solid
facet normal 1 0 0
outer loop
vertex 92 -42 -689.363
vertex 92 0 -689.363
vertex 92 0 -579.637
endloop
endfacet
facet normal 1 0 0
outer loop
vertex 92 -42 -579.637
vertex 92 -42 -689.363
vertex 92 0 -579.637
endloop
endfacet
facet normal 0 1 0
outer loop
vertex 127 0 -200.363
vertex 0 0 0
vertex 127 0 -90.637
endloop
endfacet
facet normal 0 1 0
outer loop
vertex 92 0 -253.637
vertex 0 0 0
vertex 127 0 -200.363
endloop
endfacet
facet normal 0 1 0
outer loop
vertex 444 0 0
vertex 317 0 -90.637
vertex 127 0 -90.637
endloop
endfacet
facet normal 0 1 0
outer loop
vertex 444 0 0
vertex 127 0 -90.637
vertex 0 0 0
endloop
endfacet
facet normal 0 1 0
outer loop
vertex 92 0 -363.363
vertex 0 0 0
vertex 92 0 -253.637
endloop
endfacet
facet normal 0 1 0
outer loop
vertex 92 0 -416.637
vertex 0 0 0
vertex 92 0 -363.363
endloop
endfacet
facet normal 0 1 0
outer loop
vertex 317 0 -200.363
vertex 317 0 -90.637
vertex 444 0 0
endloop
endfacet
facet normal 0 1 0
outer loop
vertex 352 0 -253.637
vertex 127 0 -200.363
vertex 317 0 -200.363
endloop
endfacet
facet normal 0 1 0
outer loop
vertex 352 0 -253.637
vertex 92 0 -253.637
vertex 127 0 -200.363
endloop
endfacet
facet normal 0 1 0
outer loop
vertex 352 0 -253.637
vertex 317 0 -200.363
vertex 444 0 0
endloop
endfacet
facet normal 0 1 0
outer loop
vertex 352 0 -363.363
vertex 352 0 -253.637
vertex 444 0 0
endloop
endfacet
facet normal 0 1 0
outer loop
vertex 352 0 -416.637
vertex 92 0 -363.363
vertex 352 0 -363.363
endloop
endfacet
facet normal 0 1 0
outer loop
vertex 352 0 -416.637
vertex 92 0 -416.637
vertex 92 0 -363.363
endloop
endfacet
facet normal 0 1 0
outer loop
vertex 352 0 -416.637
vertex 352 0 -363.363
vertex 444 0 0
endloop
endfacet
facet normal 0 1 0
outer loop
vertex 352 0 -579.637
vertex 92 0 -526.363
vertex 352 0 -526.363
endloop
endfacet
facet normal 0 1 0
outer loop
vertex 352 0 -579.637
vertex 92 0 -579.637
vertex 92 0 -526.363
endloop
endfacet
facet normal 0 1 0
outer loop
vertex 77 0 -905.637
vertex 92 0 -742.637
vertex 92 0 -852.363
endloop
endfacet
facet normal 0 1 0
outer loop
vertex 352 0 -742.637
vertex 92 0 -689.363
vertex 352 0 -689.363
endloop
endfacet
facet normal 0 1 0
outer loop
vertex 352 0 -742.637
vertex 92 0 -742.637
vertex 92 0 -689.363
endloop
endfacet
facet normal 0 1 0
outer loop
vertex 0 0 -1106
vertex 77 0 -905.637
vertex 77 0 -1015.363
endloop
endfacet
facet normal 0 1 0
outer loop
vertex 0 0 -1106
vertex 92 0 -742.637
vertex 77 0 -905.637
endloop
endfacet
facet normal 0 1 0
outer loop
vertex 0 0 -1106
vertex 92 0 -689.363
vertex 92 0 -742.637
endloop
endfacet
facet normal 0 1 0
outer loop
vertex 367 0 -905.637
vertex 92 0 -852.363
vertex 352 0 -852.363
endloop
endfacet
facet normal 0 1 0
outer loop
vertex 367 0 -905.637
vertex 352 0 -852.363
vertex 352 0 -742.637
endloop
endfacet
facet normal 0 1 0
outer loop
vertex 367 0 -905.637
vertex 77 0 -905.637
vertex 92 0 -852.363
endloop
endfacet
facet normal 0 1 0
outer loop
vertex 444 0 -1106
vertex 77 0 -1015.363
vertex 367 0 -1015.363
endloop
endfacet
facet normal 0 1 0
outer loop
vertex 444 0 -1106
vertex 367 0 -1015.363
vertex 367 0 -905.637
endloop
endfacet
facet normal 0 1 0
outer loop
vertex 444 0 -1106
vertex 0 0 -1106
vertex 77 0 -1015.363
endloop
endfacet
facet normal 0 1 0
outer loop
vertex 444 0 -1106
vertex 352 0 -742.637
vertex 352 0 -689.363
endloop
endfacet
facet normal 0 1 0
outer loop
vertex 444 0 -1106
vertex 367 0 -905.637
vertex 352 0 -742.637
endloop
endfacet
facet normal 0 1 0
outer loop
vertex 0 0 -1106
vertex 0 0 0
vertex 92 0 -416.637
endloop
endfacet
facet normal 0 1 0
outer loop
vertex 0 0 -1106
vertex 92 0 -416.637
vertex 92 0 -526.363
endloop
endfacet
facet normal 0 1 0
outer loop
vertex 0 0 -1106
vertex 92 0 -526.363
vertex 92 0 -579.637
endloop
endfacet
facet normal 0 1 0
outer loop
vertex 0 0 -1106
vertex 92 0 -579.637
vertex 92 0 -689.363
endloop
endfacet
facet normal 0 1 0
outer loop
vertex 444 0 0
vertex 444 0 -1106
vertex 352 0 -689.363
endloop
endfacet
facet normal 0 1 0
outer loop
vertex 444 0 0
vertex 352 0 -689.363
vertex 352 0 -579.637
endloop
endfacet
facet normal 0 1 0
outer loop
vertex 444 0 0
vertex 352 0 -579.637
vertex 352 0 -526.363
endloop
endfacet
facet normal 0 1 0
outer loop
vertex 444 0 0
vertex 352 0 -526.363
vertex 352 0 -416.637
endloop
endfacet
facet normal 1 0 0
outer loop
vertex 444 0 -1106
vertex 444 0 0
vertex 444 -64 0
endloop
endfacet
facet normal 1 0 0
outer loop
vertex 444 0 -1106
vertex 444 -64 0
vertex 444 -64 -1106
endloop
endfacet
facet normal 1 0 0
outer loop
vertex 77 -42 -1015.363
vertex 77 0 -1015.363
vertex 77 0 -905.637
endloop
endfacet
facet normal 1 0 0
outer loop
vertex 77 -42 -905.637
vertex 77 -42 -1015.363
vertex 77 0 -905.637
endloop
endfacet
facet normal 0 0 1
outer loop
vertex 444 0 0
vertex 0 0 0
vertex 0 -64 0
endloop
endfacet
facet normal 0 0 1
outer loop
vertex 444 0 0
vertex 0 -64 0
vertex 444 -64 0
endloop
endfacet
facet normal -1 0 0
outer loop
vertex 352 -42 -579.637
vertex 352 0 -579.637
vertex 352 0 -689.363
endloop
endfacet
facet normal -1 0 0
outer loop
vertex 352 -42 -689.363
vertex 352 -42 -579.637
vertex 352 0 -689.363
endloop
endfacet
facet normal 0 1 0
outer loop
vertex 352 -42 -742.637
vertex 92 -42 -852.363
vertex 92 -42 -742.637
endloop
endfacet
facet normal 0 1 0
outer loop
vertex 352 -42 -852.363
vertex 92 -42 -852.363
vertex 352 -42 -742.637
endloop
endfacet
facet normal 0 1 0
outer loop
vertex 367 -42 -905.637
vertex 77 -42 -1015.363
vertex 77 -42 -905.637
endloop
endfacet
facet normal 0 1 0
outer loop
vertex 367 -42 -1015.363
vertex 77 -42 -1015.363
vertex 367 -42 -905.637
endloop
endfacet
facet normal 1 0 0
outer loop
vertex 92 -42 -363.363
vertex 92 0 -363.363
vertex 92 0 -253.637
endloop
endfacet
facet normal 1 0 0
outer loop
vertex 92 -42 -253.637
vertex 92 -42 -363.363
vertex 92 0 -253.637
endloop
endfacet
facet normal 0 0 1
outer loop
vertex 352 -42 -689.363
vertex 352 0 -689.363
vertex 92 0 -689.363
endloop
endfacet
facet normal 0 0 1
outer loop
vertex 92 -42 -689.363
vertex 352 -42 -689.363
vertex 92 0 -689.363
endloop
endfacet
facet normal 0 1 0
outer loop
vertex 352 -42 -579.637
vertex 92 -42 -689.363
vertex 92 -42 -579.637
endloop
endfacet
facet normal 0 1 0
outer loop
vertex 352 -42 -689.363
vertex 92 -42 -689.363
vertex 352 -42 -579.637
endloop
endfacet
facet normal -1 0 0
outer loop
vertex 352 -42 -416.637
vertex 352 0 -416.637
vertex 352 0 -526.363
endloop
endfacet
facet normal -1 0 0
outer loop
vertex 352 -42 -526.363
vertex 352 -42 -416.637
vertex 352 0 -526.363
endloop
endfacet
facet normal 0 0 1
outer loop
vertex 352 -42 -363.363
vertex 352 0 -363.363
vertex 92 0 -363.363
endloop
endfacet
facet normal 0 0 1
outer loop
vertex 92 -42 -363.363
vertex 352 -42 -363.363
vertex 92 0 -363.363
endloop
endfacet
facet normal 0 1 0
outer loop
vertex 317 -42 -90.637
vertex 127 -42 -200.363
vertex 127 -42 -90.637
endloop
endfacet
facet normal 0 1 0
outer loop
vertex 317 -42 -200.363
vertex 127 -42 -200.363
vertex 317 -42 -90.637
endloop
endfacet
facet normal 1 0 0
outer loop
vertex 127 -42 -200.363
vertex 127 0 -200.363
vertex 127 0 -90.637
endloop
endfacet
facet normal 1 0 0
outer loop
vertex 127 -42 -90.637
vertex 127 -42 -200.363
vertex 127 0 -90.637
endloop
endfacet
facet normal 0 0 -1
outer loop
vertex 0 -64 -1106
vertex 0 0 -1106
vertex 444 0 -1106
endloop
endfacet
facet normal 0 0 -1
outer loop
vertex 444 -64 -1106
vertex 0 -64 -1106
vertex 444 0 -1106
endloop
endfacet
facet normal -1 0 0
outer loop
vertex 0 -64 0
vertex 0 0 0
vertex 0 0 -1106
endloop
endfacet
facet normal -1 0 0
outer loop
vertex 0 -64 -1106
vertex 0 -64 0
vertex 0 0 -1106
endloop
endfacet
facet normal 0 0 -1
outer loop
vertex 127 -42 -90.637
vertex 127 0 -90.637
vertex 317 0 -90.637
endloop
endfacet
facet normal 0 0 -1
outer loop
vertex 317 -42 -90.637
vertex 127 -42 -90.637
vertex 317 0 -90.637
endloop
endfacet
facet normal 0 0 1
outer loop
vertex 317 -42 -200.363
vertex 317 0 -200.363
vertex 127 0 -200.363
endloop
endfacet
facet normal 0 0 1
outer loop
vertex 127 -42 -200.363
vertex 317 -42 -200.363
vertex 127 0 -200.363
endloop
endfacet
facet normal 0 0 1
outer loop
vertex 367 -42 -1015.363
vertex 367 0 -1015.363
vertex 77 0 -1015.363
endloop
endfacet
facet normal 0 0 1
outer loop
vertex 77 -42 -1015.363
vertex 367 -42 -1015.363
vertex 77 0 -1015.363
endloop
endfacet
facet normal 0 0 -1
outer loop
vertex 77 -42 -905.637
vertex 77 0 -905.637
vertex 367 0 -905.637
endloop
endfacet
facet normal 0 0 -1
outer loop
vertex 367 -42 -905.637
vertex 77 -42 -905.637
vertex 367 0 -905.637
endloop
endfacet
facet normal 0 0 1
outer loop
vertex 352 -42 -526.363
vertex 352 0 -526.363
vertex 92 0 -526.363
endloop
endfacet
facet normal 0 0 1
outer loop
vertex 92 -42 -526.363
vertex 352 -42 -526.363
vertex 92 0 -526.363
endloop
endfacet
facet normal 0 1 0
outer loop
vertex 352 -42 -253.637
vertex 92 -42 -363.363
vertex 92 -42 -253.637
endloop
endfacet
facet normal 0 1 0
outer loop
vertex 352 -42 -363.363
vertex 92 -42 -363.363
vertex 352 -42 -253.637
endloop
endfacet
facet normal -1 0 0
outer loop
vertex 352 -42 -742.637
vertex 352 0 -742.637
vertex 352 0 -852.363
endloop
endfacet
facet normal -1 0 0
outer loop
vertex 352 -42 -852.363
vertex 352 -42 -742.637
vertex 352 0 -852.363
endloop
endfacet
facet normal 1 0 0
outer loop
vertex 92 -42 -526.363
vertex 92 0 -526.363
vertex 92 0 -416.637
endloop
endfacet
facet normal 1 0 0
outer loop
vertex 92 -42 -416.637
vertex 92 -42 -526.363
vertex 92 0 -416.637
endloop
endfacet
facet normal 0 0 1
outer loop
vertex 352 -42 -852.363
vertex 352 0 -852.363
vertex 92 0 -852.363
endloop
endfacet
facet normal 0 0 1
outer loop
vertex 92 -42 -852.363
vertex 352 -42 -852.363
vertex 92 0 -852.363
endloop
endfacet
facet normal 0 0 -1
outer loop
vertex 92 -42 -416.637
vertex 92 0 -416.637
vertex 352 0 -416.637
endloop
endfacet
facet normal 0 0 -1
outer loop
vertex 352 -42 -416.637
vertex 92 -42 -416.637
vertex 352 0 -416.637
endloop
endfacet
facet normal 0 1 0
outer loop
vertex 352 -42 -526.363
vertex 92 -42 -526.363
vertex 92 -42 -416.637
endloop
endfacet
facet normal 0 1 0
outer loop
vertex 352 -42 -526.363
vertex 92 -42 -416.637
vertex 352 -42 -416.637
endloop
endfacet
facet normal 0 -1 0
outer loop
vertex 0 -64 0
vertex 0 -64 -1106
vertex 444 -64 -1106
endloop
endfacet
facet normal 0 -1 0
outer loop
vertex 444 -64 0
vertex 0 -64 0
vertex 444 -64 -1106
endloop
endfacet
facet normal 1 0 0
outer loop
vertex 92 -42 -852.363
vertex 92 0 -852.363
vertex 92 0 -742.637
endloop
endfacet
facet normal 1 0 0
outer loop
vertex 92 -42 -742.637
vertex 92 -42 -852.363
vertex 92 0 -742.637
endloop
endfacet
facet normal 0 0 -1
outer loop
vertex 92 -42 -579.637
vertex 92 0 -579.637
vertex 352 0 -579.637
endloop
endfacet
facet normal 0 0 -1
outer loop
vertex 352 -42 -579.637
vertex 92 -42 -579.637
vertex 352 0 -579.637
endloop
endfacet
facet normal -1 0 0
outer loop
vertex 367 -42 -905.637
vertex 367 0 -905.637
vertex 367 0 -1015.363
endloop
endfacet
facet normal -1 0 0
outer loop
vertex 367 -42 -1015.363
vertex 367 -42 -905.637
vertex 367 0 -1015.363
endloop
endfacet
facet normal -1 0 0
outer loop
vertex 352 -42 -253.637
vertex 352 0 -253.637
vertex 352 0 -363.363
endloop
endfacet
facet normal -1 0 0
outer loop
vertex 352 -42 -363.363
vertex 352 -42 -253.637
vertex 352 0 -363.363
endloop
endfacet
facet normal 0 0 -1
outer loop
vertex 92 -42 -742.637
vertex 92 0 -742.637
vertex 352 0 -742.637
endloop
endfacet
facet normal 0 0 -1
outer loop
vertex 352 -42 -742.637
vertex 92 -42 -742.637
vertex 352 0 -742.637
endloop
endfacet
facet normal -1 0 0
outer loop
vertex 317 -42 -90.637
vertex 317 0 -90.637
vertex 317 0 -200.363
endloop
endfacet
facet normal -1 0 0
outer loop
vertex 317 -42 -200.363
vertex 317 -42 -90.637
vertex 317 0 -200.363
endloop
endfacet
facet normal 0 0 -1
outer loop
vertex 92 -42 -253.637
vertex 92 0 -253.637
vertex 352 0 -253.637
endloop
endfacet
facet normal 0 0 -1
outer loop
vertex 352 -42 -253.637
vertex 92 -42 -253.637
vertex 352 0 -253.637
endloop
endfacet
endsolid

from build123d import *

# Parameters (mm, degrees)
SKETCH_1_W          = 444
SKETCH_1_H          = 1106
EXTRUDE_305_DEPTH   = 64
CUT_EXTRUDE_1_DEPTH = 42


with BuildPart() as part:
    # Эскиз1 → Extrude 305 (new body)
    with BuildSketch(Plane(origin=(0, 0, 0), x_dir=(1, 0, 0), z_dir=(0, 1, 0))):
        with Locations((222, 553)):
            Rectangle(SKETCH_1_W, SKETCH_1_H)
    extrude(amount=-EXTRUDE_305_DEPTH)

    # Эскиз2 → Вырез-Вытянуть1 (cut)
    with BuildSketch(Plane(origin=(0, 0, 0), x_dir=(1, 0, 0), z_dir=(0, 1, 0))):
        Polygon((222, 1015.363466897), (77, 1015.363466897), (77, 905.636533103), (222, 905.636533103), (367, 905.636533103), (367, 1015.363466897), align=None)
        Polygon((222, 852.363466897), (92, 852.363466897), (92, 742.636533103), (222, 742.636533103), (352, 742.636533103), (352, 852.363466897), align=None)
        Polygon((222, 689.363466897), (92, 689.363466897), (92, 579.636533103), (222, 579.636533103), (352, 579.636533103), (352, 689.363466897), align=None)
        Polygon((222, 526.363466897), (92, 526.363466897), (92, 416.636533103), (222, 416.636533103), (352, 416.636533103), (352, 526.363466897), align=None)
        Polygon((222, 363.363466897), (92, 363.363466897), (92, 253.636533103), (222, 253.636533103), (352, 253.636533103), (352, 363.363466897), align=None)
        Polygon((222, 200.363466897), (127, 200.363466897), (127, 90.636533103), (222, 90.636533103), (317, 90.636533103), (317, 200.363466897), align=None)
    extrude(amount=-CUT_EXTRUDE_1_DEPTH, mode=Mode.SUBTRACT)


solid = part.part
